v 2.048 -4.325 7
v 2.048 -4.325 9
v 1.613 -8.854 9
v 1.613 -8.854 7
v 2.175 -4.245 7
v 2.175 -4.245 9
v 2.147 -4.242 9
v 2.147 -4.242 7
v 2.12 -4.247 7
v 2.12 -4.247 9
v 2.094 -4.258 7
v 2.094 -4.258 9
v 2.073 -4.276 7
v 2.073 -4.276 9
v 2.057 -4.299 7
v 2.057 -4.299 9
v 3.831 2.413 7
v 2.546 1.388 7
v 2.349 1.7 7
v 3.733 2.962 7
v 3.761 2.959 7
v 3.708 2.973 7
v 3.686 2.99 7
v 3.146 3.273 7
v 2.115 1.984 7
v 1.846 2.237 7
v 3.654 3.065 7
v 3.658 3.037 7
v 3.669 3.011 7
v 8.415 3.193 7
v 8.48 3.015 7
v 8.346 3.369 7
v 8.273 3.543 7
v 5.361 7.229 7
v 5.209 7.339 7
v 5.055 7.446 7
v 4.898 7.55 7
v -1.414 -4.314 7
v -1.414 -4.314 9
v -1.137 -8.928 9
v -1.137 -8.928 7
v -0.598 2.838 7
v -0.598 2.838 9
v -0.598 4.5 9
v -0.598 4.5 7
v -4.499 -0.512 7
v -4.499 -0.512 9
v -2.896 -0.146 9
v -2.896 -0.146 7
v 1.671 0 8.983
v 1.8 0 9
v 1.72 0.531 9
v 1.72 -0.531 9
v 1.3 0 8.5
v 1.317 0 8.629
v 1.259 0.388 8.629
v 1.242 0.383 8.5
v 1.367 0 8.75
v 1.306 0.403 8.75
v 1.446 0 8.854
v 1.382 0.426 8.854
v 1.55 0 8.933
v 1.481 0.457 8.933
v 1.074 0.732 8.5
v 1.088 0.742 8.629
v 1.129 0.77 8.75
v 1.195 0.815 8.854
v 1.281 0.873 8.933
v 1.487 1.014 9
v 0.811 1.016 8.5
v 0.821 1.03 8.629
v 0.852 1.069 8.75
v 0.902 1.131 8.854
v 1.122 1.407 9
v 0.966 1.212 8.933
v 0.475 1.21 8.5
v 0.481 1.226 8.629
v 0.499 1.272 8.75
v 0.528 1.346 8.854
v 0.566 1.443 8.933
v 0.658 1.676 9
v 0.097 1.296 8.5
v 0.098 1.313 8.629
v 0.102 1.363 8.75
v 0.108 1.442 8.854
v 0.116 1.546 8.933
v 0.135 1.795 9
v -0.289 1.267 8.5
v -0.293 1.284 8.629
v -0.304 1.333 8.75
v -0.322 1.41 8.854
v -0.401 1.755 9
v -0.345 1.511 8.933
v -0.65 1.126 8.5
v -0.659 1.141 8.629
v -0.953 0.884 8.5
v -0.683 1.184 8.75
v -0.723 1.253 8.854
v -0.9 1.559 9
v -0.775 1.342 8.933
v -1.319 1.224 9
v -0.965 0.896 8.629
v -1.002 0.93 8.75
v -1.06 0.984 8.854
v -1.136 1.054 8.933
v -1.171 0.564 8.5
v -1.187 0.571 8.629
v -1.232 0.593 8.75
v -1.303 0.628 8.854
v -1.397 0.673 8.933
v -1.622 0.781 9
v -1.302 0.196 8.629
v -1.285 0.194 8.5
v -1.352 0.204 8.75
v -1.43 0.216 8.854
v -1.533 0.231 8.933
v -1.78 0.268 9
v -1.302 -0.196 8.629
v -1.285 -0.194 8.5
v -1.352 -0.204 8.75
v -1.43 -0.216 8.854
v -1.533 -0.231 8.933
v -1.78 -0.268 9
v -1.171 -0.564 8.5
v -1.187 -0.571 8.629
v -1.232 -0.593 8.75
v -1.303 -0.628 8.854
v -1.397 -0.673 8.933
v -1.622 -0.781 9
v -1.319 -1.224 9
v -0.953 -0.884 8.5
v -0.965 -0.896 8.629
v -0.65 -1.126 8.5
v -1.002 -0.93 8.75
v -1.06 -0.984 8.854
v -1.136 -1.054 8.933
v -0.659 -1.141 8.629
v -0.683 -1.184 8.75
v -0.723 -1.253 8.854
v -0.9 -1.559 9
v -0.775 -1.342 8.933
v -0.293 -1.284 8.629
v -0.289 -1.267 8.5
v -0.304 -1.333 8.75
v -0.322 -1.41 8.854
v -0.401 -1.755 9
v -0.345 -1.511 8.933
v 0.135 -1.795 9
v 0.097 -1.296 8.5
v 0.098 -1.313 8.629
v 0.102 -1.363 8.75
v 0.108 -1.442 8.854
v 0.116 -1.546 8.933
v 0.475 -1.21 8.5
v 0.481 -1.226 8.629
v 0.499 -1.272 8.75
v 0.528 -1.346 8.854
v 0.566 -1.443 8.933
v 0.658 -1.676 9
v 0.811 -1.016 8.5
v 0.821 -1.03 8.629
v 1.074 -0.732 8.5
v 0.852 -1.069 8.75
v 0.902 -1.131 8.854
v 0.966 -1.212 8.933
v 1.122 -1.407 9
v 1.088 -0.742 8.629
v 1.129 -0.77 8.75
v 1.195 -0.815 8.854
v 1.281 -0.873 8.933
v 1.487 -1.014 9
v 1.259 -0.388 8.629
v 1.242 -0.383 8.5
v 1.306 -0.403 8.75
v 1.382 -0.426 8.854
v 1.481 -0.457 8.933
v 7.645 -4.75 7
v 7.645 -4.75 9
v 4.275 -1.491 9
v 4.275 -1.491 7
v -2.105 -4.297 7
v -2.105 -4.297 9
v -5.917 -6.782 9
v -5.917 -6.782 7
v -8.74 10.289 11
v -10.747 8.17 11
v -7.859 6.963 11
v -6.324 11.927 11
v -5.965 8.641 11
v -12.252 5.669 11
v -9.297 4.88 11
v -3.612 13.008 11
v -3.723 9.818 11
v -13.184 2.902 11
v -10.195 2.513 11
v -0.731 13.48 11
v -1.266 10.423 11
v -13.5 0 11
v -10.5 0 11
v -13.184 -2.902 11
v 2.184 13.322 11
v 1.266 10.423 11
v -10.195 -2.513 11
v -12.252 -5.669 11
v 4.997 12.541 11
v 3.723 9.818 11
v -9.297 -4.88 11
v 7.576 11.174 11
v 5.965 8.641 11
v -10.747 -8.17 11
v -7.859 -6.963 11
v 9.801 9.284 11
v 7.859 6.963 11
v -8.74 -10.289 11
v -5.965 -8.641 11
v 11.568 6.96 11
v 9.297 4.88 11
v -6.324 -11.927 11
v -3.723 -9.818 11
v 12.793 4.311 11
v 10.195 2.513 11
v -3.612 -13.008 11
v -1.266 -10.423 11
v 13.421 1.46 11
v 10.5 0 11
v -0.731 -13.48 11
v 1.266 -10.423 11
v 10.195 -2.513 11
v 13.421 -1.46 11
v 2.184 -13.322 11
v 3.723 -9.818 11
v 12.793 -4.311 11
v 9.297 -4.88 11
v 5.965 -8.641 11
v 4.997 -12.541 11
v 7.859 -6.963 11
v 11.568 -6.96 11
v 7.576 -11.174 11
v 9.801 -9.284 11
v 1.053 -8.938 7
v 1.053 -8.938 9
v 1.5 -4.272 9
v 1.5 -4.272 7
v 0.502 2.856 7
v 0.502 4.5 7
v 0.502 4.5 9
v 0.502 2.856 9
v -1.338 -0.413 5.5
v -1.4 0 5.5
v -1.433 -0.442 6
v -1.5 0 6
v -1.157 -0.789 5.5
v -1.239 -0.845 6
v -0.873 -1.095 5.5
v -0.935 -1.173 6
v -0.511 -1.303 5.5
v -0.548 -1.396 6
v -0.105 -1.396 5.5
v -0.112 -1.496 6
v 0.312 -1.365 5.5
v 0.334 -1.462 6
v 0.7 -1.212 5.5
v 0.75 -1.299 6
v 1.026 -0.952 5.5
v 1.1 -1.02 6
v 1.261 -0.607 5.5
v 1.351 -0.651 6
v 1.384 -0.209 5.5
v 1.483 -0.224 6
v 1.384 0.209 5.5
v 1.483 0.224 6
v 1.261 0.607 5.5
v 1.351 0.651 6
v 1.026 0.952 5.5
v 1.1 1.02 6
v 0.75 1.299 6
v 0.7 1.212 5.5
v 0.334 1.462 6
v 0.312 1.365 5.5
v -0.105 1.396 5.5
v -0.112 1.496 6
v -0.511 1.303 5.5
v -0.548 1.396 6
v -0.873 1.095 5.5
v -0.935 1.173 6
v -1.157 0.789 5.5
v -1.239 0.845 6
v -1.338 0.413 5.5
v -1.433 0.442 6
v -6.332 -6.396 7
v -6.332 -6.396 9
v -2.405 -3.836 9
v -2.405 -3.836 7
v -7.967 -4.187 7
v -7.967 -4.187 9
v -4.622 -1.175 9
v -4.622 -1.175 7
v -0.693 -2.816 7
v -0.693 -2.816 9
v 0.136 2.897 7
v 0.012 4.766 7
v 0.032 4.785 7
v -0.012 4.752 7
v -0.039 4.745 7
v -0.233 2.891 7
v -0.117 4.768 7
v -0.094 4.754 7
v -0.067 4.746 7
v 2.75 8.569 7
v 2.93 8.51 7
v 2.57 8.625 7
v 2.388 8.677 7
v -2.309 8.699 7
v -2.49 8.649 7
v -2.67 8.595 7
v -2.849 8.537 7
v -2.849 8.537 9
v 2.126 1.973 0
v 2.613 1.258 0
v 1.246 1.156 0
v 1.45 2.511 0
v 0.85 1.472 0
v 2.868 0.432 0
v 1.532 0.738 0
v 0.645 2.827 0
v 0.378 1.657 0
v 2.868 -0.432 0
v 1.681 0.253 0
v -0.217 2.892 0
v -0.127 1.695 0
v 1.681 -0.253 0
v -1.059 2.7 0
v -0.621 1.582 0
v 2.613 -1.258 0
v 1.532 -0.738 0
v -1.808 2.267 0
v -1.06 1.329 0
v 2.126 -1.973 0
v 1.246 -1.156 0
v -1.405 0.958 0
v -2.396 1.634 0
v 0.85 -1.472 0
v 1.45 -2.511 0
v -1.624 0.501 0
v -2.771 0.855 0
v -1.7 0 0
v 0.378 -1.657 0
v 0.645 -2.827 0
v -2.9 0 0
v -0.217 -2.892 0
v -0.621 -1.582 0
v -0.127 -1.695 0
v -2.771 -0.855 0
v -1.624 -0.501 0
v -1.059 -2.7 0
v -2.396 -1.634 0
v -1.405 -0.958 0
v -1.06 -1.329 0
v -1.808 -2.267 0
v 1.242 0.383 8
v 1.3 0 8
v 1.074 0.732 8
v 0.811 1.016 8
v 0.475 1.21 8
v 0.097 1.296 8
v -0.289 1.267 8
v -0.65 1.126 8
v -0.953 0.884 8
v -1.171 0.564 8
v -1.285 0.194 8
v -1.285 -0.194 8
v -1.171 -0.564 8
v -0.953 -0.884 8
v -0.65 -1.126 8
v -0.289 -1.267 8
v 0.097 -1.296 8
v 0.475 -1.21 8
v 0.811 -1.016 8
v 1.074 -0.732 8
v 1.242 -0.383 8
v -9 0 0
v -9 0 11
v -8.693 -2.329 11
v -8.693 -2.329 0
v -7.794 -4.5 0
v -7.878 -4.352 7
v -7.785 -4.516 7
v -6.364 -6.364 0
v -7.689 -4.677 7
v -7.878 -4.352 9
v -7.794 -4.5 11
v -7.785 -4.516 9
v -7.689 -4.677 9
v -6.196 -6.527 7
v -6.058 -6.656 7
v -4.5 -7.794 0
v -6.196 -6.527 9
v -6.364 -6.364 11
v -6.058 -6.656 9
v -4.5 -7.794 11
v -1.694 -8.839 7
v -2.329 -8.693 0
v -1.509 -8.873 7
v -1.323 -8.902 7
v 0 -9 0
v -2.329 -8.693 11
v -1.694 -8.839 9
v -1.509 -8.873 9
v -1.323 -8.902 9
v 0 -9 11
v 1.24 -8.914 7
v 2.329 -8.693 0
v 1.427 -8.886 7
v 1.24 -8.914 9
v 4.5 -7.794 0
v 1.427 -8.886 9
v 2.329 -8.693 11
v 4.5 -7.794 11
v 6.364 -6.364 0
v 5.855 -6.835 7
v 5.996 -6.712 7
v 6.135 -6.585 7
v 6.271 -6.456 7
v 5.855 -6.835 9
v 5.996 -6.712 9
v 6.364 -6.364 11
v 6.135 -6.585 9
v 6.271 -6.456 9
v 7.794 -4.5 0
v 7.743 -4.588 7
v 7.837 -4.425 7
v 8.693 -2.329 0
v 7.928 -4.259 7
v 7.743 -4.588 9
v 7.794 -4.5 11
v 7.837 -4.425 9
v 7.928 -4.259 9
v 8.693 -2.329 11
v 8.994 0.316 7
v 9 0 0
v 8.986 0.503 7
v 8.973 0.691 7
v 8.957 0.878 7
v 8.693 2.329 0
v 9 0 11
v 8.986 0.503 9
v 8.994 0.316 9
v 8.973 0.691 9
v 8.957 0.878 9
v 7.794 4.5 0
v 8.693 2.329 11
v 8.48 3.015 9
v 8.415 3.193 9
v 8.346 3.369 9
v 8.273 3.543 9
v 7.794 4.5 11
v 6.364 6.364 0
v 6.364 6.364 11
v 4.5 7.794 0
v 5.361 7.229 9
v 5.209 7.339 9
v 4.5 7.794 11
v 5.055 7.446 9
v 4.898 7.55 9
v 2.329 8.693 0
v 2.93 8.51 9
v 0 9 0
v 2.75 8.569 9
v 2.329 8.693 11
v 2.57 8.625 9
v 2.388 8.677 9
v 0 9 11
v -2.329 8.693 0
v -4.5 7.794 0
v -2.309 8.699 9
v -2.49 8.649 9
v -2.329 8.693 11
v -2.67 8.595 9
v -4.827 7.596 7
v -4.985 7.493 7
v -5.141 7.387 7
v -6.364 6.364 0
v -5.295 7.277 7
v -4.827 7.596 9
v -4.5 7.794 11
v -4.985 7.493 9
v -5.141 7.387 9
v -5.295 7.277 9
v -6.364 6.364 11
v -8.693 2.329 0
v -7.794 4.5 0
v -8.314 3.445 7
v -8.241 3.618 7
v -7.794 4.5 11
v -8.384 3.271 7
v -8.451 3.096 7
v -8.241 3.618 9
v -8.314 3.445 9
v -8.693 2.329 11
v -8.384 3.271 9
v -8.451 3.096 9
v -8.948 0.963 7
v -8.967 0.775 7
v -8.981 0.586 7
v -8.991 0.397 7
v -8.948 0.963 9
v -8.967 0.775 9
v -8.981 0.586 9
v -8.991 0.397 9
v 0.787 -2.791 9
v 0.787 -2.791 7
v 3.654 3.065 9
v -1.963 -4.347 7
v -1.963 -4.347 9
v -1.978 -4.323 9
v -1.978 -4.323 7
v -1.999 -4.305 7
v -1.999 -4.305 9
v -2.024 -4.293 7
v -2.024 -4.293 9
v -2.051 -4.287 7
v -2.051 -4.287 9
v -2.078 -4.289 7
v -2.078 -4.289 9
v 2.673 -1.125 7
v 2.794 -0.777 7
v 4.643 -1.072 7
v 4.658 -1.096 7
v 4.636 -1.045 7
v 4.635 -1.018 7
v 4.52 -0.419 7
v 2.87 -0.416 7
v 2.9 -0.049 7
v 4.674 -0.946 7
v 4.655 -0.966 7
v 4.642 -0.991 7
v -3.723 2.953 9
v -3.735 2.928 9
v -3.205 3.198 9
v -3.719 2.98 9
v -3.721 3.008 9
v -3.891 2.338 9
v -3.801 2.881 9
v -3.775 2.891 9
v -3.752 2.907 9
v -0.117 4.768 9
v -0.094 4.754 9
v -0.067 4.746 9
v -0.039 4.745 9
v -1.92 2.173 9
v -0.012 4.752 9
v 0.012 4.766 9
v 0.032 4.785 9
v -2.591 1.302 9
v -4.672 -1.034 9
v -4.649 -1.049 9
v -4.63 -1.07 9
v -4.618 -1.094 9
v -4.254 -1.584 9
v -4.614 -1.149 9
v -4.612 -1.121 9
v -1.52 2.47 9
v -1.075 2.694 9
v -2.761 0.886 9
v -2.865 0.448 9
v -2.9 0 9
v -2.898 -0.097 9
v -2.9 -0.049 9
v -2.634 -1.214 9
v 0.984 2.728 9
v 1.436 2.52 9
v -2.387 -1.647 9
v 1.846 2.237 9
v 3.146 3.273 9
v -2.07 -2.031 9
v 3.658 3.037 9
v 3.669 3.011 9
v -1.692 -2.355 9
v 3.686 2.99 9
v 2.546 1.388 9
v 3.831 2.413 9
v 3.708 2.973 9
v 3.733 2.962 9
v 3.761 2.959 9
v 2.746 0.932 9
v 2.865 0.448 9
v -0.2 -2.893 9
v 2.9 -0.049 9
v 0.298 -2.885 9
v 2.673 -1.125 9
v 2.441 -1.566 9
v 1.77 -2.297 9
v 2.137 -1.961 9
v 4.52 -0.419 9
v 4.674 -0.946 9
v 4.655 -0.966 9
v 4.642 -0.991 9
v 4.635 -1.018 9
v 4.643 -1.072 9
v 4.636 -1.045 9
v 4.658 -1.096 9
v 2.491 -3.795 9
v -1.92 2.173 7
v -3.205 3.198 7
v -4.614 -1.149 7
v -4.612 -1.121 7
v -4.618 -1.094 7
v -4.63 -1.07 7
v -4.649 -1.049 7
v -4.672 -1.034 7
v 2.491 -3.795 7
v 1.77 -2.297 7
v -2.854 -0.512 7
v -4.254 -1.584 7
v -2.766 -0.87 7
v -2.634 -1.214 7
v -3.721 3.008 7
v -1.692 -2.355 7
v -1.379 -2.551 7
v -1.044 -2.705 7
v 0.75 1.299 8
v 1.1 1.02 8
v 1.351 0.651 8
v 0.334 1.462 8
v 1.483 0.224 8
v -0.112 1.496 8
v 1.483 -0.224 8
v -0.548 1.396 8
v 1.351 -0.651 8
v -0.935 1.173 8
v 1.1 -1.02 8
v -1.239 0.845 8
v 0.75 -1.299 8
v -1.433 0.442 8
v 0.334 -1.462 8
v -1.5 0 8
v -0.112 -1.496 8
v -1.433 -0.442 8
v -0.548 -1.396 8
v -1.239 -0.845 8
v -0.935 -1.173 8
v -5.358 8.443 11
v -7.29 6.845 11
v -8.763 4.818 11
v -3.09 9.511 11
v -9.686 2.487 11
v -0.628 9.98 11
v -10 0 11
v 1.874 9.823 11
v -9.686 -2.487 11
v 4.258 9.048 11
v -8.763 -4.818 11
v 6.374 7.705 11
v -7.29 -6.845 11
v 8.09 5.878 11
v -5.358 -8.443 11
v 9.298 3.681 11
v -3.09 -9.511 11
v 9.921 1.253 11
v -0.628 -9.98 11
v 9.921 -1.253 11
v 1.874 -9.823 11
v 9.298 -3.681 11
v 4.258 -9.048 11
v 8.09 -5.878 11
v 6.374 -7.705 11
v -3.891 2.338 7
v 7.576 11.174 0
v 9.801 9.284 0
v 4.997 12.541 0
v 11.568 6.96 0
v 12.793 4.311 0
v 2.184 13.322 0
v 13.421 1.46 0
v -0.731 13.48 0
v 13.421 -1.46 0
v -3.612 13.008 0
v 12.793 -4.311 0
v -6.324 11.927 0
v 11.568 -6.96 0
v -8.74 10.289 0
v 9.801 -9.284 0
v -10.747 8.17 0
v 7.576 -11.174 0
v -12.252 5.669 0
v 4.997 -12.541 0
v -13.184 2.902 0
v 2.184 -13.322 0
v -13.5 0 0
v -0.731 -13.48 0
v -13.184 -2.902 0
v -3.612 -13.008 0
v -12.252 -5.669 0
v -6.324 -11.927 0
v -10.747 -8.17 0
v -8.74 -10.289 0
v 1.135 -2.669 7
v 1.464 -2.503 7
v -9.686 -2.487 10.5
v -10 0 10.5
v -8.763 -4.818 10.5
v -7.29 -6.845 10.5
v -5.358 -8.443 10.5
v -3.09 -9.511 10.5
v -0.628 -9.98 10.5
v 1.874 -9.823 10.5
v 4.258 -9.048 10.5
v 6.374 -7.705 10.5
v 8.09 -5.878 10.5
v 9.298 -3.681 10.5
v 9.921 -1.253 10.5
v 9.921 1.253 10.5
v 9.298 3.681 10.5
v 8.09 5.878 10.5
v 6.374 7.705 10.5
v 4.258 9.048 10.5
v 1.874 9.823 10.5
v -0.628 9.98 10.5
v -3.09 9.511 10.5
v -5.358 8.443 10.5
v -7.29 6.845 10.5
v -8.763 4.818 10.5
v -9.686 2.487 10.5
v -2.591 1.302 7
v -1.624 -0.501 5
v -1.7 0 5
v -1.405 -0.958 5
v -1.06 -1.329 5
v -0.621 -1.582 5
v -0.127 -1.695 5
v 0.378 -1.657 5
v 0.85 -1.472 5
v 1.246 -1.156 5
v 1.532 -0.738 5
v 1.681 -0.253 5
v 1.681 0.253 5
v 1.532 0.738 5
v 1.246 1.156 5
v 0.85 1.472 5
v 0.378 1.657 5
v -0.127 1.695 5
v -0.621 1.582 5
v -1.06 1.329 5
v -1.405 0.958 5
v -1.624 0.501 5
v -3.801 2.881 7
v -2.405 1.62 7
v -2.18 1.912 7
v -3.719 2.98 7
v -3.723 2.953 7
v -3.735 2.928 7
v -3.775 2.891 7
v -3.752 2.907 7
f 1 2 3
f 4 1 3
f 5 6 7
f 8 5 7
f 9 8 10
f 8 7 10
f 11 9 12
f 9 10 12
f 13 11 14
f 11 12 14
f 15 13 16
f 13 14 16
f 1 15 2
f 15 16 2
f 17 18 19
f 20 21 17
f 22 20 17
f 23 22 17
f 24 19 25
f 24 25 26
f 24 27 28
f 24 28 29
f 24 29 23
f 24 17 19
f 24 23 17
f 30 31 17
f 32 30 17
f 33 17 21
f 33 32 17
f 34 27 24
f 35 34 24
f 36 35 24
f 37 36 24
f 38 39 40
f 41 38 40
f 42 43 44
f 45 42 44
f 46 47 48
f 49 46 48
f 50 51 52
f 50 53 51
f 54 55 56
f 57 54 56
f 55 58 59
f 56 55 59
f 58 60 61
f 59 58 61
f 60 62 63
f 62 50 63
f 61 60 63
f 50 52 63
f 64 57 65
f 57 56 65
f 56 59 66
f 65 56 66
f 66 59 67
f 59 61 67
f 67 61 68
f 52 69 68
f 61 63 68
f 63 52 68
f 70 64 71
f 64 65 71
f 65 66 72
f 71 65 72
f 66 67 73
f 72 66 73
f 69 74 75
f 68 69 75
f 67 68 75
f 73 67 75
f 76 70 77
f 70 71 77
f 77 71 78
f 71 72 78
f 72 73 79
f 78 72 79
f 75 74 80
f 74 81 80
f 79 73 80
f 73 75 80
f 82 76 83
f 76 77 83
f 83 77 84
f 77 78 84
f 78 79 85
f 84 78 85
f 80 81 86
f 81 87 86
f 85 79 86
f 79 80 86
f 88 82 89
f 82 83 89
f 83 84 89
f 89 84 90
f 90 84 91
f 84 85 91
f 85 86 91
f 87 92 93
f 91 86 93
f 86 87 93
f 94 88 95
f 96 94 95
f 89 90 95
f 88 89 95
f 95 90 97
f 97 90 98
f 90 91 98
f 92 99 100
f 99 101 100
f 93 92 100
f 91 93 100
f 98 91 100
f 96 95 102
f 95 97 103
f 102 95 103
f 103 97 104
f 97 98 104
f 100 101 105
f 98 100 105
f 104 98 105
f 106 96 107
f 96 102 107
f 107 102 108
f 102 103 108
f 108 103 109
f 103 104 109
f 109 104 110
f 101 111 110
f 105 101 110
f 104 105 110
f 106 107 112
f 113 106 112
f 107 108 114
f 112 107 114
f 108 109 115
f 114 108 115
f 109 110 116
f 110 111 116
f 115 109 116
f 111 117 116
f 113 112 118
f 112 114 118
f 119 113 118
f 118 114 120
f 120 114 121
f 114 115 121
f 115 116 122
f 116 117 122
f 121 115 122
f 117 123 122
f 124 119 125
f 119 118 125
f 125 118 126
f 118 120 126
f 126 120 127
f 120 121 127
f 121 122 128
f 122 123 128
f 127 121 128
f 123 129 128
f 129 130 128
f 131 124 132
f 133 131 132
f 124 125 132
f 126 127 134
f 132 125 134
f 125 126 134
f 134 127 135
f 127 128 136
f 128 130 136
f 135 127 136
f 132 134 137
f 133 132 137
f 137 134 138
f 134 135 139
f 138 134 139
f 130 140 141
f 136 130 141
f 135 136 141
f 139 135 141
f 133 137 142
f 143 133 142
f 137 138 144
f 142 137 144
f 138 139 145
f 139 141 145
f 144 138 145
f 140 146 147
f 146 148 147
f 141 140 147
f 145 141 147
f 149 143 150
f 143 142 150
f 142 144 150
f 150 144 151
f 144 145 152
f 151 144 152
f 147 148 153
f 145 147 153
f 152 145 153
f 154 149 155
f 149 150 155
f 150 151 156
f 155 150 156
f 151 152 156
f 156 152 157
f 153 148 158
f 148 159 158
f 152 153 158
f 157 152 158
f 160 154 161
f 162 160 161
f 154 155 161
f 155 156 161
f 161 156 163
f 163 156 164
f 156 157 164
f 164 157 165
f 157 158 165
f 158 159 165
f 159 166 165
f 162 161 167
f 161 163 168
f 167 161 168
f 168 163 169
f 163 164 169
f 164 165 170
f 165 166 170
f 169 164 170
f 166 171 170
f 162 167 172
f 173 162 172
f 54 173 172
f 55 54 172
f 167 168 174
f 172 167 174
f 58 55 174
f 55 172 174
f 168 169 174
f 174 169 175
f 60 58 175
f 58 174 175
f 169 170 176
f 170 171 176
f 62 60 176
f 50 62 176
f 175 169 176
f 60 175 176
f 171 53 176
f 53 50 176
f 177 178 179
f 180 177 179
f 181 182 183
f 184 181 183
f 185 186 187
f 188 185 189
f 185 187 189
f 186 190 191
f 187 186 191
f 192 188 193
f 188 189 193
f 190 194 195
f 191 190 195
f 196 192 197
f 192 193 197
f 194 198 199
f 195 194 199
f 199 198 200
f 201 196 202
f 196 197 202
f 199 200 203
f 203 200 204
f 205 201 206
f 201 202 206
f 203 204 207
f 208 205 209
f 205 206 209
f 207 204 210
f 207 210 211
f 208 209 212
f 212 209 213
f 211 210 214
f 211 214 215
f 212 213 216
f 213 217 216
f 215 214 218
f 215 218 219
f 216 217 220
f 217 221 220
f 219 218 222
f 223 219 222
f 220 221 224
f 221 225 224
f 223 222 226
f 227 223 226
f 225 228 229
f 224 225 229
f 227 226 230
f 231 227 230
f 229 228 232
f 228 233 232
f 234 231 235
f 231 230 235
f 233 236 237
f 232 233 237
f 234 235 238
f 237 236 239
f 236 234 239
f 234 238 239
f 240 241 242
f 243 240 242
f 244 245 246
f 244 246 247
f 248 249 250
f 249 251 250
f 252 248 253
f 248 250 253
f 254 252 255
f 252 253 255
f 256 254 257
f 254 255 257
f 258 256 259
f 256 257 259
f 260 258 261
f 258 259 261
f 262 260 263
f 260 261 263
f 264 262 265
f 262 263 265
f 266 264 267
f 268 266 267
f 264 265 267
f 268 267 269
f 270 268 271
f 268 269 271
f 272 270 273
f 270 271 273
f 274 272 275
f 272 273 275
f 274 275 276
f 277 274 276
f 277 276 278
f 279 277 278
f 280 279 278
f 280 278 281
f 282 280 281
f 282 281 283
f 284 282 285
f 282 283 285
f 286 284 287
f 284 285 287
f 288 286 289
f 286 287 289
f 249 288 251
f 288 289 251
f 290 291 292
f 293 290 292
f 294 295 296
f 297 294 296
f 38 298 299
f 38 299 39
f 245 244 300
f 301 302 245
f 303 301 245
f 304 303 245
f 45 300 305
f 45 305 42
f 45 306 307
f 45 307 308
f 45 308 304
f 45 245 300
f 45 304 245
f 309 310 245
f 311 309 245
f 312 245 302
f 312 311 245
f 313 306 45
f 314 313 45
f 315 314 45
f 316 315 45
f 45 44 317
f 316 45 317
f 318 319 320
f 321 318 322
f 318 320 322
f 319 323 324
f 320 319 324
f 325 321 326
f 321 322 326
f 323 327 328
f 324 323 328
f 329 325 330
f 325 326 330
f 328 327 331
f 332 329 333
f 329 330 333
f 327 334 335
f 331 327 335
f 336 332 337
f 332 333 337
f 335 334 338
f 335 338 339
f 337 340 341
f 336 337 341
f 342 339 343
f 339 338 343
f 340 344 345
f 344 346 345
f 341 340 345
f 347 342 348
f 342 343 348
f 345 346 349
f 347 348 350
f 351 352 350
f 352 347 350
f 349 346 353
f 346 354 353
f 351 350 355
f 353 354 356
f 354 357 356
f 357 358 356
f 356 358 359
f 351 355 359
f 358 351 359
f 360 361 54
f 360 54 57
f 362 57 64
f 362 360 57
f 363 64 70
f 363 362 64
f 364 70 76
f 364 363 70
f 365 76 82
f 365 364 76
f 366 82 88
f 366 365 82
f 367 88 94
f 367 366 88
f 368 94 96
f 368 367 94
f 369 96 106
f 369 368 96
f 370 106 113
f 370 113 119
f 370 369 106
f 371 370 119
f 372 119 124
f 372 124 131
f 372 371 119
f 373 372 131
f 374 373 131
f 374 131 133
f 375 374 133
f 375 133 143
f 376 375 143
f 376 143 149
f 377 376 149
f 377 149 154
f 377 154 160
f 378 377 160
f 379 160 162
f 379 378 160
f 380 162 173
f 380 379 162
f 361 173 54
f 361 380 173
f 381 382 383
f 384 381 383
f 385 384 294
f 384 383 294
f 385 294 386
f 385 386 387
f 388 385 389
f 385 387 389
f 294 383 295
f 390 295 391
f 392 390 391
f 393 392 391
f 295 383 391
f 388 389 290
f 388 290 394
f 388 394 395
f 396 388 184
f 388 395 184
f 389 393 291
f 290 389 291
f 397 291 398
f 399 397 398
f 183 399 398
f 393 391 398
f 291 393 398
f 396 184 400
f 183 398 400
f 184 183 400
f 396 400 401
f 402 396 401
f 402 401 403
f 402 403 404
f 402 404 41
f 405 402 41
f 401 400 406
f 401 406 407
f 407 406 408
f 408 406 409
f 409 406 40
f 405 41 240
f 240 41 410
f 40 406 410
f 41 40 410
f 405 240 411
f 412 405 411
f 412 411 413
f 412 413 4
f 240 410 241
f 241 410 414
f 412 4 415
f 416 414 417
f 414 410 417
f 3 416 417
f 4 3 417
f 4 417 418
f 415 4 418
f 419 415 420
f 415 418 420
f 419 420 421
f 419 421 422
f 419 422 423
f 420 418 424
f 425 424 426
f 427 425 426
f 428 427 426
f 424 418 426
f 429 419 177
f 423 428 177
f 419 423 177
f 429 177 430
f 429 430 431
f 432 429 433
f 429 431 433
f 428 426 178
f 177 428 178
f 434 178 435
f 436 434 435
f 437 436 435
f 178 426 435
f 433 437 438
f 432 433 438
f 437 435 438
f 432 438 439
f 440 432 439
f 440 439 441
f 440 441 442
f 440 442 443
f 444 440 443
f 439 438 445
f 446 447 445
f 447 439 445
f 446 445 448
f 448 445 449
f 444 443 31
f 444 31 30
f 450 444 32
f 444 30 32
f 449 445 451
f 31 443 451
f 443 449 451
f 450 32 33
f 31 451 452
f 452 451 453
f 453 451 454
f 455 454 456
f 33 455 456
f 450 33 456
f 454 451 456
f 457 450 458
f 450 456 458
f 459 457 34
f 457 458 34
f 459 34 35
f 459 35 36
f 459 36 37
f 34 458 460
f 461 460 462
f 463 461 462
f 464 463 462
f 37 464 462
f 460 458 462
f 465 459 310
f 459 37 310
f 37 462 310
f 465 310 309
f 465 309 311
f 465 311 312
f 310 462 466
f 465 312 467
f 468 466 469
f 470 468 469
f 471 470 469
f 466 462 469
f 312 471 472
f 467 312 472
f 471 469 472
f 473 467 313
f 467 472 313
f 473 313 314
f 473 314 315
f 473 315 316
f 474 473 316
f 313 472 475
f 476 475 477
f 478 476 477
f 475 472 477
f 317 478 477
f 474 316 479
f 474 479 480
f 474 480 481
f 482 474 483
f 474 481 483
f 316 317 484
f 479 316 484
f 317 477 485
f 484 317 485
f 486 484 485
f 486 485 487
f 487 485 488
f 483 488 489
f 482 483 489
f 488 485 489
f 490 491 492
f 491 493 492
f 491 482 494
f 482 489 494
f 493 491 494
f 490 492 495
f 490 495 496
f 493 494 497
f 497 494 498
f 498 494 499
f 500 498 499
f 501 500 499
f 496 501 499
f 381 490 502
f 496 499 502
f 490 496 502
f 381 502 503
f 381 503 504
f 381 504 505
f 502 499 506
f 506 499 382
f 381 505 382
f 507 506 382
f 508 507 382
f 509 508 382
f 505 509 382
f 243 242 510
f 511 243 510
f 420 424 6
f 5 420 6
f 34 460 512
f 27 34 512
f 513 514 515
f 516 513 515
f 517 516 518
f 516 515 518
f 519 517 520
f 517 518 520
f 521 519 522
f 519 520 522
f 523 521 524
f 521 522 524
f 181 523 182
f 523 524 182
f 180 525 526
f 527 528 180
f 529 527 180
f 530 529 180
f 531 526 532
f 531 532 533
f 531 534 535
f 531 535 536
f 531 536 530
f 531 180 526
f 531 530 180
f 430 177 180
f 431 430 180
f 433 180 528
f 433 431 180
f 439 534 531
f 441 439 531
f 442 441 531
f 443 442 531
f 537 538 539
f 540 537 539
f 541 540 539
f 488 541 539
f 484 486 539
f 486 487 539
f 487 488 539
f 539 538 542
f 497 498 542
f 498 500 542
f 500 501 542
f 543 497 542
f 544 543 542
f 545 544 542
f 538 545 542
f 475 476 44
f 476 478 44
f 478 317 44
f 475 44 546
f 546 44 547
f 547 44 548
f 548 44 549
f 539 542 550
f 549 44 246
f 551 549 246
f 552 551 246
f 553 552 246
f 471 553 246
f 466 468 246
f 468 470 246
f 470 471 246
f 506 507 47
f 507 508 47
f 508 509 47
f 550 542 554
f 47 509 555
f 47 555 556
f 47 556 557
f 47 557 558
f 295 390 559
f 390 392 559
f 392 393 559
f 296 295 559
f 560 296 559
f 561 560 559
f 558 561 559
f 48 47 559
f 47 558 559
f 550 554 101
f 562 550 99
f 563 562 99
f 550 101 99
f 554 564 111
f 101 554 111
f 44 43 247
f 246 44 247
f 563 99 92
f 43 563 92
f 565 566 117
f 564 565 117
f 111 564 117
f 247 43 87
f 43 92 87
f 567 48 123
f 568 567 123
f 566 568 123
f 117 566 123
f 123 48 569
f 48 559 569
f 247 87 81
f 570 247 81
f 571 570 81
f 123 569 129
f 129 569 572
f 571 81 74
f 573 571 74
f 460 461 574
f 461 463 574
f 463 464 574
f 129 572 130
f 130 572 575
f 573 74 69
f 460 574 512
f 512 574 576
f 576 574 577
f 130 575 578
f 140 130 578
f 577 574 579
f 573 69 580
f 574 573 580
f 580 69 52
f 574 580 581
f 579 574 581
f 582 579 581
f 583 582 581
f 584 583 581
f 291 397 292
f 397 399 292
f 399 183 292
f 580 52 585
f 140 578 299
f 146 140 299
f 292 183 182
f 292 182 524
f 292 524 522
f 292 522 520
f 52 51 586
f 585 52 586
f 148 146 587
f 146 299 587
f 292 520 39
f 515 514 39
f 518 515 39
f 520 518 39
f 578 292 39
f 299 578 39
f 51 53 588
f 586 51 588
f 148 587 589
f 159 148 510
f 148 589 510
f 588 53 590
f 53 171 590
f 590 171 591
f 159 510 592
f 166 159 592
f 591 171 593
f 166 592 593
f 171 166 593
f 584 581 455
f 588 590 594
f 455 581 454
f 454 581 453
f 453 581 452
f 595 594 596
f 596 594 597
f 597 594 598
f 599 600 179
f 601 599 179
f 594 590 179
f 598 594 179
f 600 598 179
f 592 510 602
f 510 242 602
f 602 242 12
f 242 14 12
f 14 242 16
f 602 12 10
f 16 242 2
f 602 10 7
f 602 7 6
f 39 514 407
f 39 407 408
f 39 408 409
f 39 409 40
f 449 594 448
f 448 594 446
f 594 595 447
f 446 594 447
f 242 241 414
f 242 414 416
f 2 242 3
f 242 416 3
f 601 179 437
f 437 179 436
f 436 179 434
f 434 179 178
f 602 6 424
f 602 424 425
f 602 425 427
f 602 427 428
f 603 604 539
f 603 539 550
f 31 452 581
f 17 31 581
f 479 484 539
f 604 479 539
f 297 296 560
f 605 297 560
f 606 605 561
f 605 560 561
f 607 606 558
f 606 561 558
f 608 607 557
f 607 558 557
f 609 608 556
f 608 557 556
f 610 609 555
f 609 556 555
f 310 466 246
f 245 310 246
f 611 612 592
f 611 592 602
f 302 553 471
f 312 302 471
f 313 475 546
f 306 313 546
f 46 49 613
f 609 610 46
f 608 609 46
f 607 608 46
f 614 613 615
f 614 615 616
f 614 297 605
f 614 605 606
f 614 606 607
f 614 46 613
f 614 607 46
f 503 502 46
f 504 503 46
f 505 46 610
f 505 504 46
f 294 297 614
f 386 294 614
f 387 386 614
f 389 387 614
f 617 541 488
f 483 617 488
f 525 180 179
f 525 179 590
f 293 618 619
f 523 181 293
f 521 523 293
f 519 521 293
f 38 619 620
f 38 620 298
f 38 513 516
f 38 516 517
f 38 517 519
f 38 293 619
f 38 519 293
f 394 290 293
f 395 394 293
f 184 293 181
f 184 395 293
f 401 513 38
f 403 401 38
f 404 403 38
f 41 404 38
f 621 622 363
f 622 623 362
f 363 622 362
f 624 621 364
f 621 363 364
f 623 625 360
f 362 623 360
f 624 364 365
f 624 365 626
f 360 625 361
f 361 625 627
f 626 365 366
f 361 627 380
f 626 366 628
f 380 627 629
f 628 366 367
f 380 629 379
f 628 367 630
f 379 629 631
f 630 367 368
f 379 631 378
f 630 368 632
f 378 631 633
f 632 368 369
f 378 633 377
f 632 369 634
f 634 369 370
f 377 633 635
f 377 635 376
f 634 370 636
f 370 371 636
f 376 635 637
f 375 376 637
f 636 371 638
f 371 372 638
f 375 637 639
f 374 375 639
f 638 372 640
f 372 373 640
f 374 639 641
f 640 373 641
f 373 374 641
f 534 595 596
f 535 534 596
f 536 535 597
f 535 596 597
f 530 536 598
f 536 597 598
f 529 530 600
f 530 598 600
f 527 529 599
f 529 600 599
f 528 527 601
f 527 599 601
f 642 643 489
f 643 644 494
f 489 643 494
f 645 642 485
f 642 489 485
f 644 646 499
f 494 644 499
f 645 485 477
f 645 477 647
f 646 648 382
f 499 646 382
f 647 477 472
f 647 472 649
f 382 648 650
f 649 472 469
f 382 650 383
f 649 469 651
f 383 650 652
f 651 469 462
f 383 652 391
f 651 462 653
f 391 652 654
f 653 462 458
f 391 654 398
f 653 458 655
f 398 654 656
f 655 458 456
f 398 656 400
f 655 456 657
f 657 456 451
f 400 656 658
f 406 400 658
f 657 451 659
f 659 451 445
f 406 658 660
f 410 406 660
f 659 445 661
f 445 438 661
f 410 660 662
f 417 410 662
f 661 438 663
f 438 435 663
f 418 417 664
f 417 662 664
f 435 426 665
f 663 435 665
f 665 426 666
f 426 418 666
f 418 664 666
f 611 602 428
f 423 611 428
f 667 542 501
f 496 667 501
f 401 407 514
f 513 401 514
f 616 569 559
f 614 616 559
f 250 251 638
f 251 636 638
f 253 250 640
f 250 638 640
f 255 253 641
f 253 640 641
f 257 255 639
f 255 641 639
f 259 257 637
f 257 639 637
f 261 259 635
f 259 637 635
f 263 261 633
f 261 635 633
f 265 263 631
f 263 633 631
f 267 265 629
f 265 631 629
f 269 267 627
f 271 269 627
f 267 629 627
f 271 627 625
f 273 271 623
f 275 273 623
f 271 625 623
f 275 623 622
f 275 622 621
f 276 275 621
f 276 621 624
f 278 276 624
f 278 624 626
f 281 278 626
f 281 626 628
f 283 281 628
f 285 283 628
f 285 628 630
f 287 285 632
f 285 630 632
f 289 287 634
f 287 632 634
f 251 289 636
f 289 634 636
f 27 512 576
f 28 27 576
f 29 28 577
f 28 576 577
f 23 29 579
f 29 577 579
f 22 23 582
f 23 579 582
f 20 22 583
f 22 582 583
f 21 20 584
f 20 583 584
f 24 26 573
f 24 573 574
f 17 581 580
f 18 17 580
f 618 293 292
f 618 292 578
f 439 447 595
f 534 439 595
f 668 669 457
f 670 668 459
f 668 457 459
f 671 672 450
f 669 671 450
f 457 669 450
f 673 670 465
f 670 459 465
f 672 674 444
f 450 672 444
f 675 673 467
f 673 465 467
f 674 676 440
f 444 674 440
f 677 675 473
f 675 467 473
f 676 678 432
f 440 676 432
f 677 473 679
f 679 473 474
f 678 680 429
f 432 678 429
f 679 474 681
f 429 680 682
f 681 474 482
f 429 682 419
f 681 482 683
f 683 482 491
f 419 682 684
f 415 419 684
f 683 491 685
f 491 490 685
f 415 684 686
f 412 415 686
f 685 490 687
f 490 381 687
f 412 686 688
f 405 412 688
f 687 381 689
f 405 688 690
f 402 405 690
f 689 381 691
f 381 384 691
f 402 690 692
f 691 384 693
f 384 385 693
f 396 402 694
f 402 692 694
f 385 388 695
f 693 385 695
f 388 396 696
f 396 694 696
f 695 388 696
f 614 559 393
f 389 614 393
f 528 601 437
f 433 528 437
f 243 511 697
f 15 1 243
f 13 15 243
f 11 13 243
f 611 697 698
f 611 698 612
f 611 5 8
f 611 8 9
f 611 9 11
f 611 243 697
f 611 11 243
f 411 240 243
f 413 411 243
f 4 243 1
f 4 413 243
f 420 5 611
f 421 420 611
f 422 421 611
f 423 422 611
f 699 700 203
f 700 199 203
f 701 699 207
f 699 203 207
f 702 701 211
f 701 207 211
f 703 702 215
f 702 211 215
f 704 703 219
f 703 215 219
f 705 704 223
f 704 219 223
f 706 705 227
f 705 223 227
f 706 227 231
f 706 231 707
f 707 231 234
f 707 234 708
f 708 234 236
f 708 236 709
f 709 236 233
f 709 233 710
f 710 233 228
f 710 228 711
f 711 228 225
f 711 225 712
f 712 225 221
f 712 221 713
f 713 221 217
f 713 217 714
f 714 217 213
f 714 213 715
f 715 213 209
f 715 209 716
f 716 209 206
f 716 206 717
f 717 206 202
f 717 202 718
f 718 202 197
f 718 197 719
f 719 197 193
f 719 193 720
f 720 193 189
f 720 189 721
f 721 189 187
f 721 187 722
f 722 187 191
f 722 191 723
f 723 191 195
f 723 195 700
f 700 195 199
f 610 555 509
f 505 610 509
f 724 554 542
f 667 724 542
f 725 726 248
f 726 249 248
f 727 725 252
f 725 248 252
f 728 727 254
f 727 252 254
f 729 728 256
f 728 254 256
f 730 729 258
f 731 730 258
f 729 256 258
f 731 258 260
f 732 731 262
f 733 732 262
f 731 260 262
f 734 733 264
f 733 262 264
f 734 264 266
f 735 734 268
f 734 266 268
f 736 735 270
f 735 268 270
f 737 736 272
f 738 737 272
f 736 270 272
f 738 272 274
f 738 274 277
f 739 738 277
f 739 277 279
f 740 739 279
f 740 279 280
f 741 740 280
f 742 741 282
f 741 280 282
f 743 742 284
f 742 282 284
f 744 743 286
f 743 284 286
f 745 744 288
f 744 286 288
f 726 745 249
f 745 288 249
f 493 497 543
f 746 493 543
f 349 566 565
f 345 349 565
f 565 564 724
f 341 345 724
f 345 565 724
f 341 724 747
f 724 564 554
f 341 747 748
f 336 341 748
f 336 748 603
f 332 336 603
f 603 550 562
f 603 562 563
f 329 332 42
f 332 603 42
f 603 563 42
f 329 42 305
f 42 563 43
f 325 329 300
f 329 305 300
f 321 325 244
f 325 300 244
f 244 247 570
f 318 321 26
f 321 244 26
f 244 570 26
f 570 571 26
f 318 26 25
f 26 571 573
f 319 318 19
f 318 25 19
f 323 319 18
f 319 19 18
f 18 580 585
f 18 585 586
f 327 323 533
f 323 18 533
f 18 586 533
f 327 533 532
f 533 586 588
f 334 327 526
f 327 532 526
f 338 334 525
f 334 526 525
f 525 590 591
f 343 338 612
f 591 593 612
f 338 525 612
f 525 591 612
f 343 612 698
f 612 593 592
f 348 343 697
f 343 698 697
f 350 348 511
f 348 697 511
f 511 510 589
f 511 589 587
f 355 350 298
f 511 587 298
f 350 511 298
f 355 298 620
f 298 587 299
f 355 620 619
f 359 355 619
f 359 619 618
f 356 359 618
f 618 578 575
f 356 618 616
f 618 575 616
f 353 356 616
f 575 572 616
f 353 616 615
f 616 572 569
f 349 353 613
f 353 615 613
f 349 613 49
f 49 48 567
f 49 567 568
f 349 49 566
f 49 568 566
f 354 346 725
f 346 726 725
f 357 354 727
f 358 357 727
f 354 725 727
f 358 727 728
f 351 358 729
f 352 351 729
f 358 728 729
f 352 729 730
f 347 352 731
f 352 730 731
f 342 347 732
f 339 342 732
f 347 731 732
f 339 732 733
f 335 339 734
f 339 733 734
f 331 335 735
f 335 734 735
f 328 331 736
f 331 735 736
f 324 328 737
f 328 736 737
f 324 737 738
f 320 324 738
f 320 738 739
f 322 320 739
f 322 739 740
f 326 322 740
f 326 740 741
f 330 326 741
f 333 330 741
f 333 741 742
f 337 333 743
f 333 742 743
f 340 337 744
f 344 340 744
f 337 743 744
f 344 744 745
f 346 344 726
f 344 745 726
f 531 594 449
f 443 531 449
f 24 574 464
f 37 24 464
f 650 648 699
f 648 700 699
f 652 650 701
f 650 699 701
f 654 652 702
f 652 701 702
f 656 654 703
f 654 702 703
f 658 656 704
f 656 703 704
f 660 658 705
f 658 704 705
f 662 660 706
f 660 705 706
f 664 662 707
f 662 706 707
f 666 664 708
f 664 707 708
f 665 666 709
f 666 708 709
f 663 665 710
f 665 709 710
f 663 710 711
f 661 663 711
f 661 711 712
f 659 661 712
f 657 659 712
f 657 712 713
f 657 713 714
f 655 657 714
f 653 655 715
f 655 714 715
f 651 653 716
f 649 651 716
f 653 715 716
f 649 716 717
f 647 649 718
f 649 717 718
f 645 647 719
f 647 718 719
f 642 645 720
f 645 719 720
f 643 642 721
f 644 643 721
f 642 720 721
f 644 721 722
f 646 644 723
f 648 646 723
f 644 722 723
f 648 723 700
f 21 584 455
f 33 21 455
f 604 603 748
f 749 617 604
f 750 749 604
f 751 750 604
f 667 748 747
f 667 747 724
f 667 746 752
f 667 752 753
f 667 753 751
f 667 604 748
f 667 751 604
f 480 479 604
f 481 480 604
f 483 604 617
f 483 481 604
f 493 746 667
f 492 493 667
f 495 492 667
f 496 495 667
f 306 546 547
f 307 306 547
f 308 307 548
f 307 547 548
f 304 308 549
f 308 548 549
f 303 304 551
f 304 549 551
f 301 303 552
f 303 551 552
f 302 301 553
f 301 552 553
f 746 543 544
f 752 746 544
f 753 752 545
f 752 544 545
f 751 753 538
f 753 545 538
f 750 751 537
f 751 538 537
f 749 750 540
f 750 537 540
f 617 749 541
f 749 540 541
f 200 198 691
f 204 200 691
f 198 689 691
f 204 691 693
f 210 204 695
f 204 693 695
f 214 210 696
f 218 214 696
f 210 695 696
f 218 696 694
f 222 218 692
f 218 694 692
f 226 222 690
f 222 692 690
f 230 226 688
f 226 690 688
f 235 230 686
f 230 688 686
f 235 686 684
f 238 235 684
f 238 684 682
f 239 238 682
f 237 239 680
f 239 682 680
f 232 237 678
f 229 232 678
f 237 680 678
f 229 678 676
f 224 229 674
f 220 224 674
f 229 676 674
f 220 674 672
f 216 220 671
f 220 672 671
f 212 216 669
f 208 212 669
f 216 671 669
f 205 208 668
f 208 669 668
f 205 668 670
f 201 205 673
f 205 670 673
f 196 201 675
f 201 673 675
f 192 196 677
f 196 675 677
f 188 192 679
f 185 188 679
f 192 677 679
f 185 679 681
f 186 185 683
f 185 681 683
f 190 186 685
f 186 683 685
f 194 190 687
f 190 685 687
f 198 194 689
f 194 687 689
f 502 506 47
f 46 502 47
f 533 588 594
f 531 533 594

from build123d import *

# Parameters (mm, degrees)
CUT_EXTRUDE1_START  = -9
SKETCH3_R           = 9
SKETCH3_R_2         = 2.9
CUT_EXTRUDE1_DEPTH  = 9
BOSS_EXTRUDE1_DEPTH = 2
CIRPATTERN1_COUNT   = 7
SKETCH5_R           = 2.9
SKETCH5_R_2         = 1.3
BOSS_EXTRUDE2_DEPTH = 1
FILLET2_R           = 0.5


with BuildPart() as part:
    # Sketch1 → Revolve1 (revolve)
    with BuildSketch(Plane(origin=(0, 0, 0), x_dir=(1, 0, 0), z_dir=(0, 1, 0))):
        Polygon((-1.7, 0), (-1.7, -5), (-1.4, -5.5), (-1.5, -6), (-1.5, -8), (-2.5, -8), (-2.5, -9), (-9, -9), (-9, -11), (-10, -11), (-10, -10.5), (-10.5, -11), (-13.5, -11), (-13.5, 0), align=None)
    revolve(axis=Axis((0, 0, 0), (0, 0, 1)))

    # Sketch3 → Cut-Extrude1 (cut)
    with BuildSketch(Plane(origin=(0, 0, 0), x_dir=(-1, 0, 0), z_dir=(0, 0, -1)).offset(CUT_EXTRUDE1_START)):
        Circle(SKETCH3_R)
        Circle(SKETCH3_R_2, mode=Mode.SUBTRACT)
    extrude(amount=CUT_EXTRUDE1_DEPTH, mode=Mode.SUBTRACT)


with BuildPart() as cut_extrude1_piece_1:
    # of the separate pieces the step leaves, piece 1, a body of its own (cut_extrude1_pieces)
    add(part.part.solids().sort_by_distance((-13.5, 0, 0))[0])

    # Sketch2 → Boss-Extrude1 (add)
    with BuildSketch(Plane.XY.offset(9)):
        with BuildLine():
            Line((-0.597826087, 4.5), (-2.848883013, 8.537204787))
            Line((-2.848883013, 8.537204787), (-2.342145206, 8.757766839))
            Line((-2.342145206, 8.757766839), (-0.117452618, 4.767845721))
            ThreePointArc((-0.117452618, 4.767845721), (-0.039367839, 4.74545664), (0.031677909, 4.784839446))
            Line((0.031677909, 4.784839446), (2.436897987, 8.757766839))
            Line((2.436897987, 8.757766839), (2.929718633, 8.509803096))
            Line((2.929718633, 8.509803096), (0.502173913, 4.5))
            Line((0.502173913, 4.5), (0.502173913, 2.44904499))
            ThreePointArc((0.502173913, 2.44904499), (-0.049135224, 2.504998888), (-0.597826087, 2.427468634))
            Line((-0.597826087, 2.427468634), (-0.597826087, 4.5))
        make_face()
    boss_extrude1 = extrude(amount=-BOSS_EXTRUDE1_DEPTH)

    # CirPattern1: Boss-Extrude1 ×7 about axis
    cirpattern1_axis = Axis((0, 0, 0), (0, 0, 1))
    for i in range(1, CIRPATTERN1_COUNT):
        add(boss_extrude1.rotate(cirpattern1_axis, i * 360 / CIRPATTERN1_COUNT))



with BuildPart() as cut_extrude1_piece_2:
    # of the separate pieces the step leaves, piece 2, a body of its own (cut_extrude1_pieces)
    add(part.part.solids().sort_by_distance((-1.7, 0, 0))[0])


with BuildPart() as cut_extrude1_piece_1_1:
    add(cut_extrude1_piece_1.part)

    add(cut_extrude1_piece_2.part)  # Boss-Extrude2 merges Cut-Extrude1 piece 2
    # Sketch5 → Boss-Extrude2 (add)
    with BuildSketch(Plane.XY.offset(8)):
        with Locations(Location((0, 0, 0), (0, 0, 180))):
            Circle(SKETCH5_R)
        Circle(SKETCH5_R_2, mode=Mode.SUBTRACT)
    extrude(amount=BOSS_EXTRUDE2_DEPTH)

    # Fillet2
    fillet2_edges = [cut_extrude1_piece_1_1.edges().sort_by_distance(p)[0] for p in [
        (-1.3, 0, 9),
    ]]
    fillet(fillet2_edges, radius=FILLET2_R)


solid = cut_extrude1_piece_1_1.part
